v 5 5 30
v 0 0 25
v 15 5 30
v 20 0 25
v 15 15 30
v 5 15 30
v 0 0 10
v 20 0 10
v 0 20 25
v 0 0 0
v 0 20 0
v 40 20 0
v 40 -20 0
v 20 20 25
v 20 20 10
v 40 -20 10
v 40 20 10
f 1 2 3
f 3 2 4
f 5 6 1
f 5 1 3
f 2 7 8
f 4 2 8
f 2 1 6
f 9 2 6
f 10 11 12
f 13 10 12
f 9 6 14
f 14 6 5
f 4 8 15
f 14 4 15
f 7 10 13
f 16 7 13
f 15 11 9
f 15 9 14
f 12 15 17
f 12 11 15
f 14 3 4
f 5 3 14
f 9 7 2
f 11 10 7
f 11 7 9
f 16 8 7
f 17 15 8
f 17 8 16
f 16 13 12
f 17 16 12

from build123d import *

# Parameters (mm, degrees)
F1_DEPTH = 10
F2_W     = 20
F2_H     = 20
F3_DEPTH = 20
F4_SIZE  = 5


with BuildPart() as f1:
    # F0 (on Top) → F1 (new body)
    with BuildSketch(Plane.XY):
        Polygon((0, 20), (0, 0), (40, -20), (40, 20), align=None)
    extrude(amount=F1_DEPTH)

    # F2 (on face) → F3 (join)
    with BuildSketch(Plane.XY.offset(10)):
        with Locations((10, 10)):
            Rectangle(F2_W, F2_H)
    extrude(amount=F3_DEPTH)

    # F4
    f4_edges = [f1.edges().sort_by_distance(p)[0] for p in [
        (0, 10, 30),
        (10, 0, 30),
        (20, 10, 30),
        (10, 20, 30),
    ]]
    chamfer(f4_edges, length=F4_SIZE)


solid = f1.part
